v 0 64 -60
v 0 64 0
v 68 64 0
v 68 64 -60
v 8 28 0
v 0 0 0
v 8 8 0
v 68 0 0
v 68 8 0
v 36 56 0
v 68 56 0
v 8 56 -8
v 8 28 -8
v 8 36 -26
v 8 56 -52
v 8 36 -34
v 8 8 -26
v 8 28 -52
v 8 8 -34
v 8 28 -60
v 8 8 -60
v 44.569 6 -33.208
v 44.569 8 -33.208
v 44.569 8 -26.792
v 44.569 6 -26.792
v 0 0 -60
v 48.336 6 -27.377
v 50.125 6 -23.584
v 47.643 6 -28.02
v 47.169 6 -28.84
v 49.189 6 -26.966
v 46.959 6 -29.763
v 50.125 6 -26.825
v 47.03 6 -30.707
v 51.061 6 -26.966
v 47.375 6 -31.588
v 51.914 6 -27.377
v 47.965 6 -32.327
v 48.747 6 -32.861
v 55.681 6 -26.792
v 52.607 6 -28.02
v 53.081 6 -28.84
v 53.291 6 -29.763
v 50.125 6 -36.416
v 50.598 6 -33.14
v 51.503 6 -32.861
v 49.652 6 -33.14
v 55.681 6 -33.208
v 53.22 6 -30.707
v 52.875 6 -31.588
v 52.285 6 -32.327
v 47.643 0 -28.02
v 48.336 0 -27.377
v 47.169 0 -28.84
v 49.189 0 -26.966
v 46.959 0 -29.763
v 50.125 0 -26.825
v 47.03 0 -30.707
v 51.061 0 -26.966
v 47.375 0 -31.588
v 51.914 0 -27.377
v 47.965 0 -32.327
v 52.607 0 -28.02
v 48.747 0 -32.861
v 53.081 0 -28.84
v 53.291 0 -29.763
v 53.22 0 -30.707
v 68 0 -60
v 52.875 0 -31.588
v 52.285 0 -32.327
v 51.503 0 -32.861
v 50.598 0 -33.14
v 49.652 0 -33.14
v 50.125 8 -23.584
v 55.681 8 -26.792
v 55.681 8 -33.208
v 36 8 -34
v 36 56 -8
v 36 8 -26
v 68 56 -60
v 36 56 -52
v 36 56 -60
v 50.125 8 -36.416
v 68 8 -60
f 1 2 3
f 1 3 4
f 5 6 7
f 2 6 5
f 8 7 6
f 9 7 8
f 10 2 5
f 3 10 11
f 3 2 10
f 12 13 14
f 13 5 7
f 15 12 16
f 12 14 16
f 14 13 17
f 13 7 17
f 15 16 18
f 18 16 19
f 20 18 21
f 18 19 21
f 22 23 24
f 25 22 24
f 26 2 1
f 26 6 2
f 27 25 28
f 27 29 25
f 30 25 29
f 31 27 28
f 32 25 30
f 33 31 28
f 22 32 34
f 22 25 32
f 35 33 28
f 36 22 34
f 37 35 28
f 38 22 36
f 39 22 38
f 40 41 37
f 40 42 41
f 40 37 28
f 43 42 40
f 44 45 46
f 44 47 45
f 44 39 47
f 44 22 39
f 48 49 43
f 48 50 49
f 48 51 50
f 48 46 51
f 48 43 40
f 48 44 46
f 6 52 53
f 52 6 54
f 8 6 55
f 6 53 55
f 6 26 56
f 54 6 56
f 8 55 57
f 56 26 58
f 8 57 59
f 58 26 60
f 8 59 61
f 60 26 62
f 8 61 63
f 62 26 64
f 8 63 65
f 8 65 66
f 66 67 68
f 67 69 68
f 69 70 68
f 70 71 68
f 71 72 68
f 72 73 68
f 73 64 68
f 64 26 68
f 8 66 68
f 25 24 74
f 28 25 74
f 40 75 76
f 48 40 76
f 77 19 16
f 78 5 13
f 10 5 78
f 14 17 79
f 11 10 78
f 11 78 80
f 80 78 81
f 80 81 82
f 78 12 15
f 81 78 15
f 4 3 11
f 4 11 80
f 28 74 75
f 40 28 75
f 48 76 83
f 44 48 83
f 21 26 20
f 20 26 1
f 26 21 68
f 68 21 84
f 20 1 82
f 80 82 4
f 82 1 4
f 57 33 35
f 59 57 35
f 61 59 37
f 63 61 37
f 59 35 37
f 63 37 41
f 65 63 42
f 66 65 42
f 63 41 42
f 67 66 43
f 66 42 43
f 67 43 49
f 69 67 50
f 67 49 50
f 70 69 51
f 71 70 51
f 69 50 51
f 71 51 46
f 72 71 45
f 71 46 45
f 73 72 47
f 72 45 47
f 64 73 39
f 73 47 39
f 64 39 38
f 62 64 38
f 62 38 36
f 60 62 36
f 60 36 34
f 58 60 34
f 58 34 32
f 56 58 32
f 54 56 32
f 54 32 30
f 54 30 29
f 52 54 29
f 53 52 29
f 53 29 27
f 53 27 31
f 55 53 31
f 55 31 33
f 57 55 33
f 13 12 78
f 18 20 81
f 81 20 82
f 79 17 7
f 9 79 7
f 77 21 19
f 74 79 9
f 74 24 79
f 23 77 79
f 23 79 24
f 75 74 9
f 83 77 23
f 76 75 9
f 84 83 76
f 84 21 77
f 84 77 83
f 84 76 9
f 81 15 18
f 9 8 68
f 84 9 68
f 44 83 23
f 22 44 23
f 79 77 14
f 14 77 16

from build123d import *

# Parameters (mm, degrees)
SKETCH1_W                = 68
SKETCH1_H                = 60
BOSS_EXTRUDE1_DEPTH      = 8
SKETCH4_W                = 8
SKETCH4_H                = 60
BOSS_EXTRUDE2_DEPTH      = 56
SKETCH5_R                = 3.175
CUT_EXTRUDE1_DEPTH       = 8
SKETCH6_W                = 60
SKETCH6_H                = 8
BOSS_EXTRUDE3_DEPTH      = 60
BOSS_EXTRUDE4_DEPTH      = 8
BOSS_EXTRUDE5_DEPTH      = 4
BOSS_EXTRUDE5_DEPTH_BACK = 4
CUT_EXTRUDE2_DEPTH       = 2


with BuildPart() as part:
    # Sketch1 → Boss-Extrude1 (new body)
    with BuildSketch(Plane(origin=(0, 0, 0), x_dir=(1, 0, 0), z_dir=(0, 1, 0))):
        with Locations((34, 30)):
            Rectangle(SKETCH1_W, SKETCH1_H)
    extrude(amount=BOSS_EXTRUDE1_DEPTH)

    # Sketch4 → Boss-Extrude2 (add)
    with BuildSketch(Plane(origin=(0, 8, 0), x_dir=(1, 0, 0), z_dir=(0, 1, 0))):
        with Locations((4, 30)):
            Rectangle(SKETCH4_W, SKETCH4_H)
    extrude(amount=BOSS_EXTRUDE2_DEPTH)

    # Sketch5 → Cut-Extrude1 (cut)
    with BuildSketch(Plane(origin=(0, 8, 0), x_dir=(1, 0, 0), z_dir=(0, 1, 0))):
        with Locations(Location((50.125, 30, 0), (0, 0, 270))):
            Circle(SKETCH5_R)
    extrude(amount=-CUT_EXTRUDE1_DEPTH, mode=Mode.SUBTRACT)

    # Sketch6 → Boss-Extrude3 (add)
    with BuildSketch(Plane(origin=(8, 0, 0), x_dir=(0, 0, -1), z_dir=(1, 0, 0))):
        with Locations((30, 60)):
            Rectangle(SKETCH6_W, SKETCH6_H)
    extrude(amount=BOSS_EXTRUDE3_DEPTH)

    # Sketch7 → Boss-Extrude4 (add)
    with BuildSketch(Plane.XY):
        Polygon((8, 56), (8, 28), (36, 56), align=None)
    boss_extrude4 = extrude(amount=-BOSS_EXTRUDE4_DEPTH)

    # Mirror1: Boss-Extrude4 across plane
    add(boss_extrude4.mirror(Plane.XY.offset(-30)))

    # Sketch8 → Boss-Extrude5 (add, two sides: drawn at the far end of the back side and taken through both)
    with BuildSketch(Plane.XY.offset(-30).offset(-BOSS_EXTRUDE5_DEPTH_BACK)):
        Polygon((8, 36), (8, 8), (36, 8), align=None)
    extrude(amount=BOSS_EXTRUDE5_DEPTH + BOSS_EXTRUDE5_DEPTH_BACK)

    # Sketch9 → Cut-Extrude2 (cut)
    with BuildSketch(Plane(origin=(0, 8, 0), x_dir=(1, 0, 0), z_dir=(0, 1, 0))):
        Polygon((50.125, 36.415804866), (44.56875, 33.207902433), (44.56875, 26.792097567), (50.125, 23.584195134), (55.68125, 26.792097567), (55.68125, 33.207902433), align=None)
    extrude(amount=-CUT_EXTRUDE2_DEPTH, mode=Mode.SUBTRACT)


solid = part.part
